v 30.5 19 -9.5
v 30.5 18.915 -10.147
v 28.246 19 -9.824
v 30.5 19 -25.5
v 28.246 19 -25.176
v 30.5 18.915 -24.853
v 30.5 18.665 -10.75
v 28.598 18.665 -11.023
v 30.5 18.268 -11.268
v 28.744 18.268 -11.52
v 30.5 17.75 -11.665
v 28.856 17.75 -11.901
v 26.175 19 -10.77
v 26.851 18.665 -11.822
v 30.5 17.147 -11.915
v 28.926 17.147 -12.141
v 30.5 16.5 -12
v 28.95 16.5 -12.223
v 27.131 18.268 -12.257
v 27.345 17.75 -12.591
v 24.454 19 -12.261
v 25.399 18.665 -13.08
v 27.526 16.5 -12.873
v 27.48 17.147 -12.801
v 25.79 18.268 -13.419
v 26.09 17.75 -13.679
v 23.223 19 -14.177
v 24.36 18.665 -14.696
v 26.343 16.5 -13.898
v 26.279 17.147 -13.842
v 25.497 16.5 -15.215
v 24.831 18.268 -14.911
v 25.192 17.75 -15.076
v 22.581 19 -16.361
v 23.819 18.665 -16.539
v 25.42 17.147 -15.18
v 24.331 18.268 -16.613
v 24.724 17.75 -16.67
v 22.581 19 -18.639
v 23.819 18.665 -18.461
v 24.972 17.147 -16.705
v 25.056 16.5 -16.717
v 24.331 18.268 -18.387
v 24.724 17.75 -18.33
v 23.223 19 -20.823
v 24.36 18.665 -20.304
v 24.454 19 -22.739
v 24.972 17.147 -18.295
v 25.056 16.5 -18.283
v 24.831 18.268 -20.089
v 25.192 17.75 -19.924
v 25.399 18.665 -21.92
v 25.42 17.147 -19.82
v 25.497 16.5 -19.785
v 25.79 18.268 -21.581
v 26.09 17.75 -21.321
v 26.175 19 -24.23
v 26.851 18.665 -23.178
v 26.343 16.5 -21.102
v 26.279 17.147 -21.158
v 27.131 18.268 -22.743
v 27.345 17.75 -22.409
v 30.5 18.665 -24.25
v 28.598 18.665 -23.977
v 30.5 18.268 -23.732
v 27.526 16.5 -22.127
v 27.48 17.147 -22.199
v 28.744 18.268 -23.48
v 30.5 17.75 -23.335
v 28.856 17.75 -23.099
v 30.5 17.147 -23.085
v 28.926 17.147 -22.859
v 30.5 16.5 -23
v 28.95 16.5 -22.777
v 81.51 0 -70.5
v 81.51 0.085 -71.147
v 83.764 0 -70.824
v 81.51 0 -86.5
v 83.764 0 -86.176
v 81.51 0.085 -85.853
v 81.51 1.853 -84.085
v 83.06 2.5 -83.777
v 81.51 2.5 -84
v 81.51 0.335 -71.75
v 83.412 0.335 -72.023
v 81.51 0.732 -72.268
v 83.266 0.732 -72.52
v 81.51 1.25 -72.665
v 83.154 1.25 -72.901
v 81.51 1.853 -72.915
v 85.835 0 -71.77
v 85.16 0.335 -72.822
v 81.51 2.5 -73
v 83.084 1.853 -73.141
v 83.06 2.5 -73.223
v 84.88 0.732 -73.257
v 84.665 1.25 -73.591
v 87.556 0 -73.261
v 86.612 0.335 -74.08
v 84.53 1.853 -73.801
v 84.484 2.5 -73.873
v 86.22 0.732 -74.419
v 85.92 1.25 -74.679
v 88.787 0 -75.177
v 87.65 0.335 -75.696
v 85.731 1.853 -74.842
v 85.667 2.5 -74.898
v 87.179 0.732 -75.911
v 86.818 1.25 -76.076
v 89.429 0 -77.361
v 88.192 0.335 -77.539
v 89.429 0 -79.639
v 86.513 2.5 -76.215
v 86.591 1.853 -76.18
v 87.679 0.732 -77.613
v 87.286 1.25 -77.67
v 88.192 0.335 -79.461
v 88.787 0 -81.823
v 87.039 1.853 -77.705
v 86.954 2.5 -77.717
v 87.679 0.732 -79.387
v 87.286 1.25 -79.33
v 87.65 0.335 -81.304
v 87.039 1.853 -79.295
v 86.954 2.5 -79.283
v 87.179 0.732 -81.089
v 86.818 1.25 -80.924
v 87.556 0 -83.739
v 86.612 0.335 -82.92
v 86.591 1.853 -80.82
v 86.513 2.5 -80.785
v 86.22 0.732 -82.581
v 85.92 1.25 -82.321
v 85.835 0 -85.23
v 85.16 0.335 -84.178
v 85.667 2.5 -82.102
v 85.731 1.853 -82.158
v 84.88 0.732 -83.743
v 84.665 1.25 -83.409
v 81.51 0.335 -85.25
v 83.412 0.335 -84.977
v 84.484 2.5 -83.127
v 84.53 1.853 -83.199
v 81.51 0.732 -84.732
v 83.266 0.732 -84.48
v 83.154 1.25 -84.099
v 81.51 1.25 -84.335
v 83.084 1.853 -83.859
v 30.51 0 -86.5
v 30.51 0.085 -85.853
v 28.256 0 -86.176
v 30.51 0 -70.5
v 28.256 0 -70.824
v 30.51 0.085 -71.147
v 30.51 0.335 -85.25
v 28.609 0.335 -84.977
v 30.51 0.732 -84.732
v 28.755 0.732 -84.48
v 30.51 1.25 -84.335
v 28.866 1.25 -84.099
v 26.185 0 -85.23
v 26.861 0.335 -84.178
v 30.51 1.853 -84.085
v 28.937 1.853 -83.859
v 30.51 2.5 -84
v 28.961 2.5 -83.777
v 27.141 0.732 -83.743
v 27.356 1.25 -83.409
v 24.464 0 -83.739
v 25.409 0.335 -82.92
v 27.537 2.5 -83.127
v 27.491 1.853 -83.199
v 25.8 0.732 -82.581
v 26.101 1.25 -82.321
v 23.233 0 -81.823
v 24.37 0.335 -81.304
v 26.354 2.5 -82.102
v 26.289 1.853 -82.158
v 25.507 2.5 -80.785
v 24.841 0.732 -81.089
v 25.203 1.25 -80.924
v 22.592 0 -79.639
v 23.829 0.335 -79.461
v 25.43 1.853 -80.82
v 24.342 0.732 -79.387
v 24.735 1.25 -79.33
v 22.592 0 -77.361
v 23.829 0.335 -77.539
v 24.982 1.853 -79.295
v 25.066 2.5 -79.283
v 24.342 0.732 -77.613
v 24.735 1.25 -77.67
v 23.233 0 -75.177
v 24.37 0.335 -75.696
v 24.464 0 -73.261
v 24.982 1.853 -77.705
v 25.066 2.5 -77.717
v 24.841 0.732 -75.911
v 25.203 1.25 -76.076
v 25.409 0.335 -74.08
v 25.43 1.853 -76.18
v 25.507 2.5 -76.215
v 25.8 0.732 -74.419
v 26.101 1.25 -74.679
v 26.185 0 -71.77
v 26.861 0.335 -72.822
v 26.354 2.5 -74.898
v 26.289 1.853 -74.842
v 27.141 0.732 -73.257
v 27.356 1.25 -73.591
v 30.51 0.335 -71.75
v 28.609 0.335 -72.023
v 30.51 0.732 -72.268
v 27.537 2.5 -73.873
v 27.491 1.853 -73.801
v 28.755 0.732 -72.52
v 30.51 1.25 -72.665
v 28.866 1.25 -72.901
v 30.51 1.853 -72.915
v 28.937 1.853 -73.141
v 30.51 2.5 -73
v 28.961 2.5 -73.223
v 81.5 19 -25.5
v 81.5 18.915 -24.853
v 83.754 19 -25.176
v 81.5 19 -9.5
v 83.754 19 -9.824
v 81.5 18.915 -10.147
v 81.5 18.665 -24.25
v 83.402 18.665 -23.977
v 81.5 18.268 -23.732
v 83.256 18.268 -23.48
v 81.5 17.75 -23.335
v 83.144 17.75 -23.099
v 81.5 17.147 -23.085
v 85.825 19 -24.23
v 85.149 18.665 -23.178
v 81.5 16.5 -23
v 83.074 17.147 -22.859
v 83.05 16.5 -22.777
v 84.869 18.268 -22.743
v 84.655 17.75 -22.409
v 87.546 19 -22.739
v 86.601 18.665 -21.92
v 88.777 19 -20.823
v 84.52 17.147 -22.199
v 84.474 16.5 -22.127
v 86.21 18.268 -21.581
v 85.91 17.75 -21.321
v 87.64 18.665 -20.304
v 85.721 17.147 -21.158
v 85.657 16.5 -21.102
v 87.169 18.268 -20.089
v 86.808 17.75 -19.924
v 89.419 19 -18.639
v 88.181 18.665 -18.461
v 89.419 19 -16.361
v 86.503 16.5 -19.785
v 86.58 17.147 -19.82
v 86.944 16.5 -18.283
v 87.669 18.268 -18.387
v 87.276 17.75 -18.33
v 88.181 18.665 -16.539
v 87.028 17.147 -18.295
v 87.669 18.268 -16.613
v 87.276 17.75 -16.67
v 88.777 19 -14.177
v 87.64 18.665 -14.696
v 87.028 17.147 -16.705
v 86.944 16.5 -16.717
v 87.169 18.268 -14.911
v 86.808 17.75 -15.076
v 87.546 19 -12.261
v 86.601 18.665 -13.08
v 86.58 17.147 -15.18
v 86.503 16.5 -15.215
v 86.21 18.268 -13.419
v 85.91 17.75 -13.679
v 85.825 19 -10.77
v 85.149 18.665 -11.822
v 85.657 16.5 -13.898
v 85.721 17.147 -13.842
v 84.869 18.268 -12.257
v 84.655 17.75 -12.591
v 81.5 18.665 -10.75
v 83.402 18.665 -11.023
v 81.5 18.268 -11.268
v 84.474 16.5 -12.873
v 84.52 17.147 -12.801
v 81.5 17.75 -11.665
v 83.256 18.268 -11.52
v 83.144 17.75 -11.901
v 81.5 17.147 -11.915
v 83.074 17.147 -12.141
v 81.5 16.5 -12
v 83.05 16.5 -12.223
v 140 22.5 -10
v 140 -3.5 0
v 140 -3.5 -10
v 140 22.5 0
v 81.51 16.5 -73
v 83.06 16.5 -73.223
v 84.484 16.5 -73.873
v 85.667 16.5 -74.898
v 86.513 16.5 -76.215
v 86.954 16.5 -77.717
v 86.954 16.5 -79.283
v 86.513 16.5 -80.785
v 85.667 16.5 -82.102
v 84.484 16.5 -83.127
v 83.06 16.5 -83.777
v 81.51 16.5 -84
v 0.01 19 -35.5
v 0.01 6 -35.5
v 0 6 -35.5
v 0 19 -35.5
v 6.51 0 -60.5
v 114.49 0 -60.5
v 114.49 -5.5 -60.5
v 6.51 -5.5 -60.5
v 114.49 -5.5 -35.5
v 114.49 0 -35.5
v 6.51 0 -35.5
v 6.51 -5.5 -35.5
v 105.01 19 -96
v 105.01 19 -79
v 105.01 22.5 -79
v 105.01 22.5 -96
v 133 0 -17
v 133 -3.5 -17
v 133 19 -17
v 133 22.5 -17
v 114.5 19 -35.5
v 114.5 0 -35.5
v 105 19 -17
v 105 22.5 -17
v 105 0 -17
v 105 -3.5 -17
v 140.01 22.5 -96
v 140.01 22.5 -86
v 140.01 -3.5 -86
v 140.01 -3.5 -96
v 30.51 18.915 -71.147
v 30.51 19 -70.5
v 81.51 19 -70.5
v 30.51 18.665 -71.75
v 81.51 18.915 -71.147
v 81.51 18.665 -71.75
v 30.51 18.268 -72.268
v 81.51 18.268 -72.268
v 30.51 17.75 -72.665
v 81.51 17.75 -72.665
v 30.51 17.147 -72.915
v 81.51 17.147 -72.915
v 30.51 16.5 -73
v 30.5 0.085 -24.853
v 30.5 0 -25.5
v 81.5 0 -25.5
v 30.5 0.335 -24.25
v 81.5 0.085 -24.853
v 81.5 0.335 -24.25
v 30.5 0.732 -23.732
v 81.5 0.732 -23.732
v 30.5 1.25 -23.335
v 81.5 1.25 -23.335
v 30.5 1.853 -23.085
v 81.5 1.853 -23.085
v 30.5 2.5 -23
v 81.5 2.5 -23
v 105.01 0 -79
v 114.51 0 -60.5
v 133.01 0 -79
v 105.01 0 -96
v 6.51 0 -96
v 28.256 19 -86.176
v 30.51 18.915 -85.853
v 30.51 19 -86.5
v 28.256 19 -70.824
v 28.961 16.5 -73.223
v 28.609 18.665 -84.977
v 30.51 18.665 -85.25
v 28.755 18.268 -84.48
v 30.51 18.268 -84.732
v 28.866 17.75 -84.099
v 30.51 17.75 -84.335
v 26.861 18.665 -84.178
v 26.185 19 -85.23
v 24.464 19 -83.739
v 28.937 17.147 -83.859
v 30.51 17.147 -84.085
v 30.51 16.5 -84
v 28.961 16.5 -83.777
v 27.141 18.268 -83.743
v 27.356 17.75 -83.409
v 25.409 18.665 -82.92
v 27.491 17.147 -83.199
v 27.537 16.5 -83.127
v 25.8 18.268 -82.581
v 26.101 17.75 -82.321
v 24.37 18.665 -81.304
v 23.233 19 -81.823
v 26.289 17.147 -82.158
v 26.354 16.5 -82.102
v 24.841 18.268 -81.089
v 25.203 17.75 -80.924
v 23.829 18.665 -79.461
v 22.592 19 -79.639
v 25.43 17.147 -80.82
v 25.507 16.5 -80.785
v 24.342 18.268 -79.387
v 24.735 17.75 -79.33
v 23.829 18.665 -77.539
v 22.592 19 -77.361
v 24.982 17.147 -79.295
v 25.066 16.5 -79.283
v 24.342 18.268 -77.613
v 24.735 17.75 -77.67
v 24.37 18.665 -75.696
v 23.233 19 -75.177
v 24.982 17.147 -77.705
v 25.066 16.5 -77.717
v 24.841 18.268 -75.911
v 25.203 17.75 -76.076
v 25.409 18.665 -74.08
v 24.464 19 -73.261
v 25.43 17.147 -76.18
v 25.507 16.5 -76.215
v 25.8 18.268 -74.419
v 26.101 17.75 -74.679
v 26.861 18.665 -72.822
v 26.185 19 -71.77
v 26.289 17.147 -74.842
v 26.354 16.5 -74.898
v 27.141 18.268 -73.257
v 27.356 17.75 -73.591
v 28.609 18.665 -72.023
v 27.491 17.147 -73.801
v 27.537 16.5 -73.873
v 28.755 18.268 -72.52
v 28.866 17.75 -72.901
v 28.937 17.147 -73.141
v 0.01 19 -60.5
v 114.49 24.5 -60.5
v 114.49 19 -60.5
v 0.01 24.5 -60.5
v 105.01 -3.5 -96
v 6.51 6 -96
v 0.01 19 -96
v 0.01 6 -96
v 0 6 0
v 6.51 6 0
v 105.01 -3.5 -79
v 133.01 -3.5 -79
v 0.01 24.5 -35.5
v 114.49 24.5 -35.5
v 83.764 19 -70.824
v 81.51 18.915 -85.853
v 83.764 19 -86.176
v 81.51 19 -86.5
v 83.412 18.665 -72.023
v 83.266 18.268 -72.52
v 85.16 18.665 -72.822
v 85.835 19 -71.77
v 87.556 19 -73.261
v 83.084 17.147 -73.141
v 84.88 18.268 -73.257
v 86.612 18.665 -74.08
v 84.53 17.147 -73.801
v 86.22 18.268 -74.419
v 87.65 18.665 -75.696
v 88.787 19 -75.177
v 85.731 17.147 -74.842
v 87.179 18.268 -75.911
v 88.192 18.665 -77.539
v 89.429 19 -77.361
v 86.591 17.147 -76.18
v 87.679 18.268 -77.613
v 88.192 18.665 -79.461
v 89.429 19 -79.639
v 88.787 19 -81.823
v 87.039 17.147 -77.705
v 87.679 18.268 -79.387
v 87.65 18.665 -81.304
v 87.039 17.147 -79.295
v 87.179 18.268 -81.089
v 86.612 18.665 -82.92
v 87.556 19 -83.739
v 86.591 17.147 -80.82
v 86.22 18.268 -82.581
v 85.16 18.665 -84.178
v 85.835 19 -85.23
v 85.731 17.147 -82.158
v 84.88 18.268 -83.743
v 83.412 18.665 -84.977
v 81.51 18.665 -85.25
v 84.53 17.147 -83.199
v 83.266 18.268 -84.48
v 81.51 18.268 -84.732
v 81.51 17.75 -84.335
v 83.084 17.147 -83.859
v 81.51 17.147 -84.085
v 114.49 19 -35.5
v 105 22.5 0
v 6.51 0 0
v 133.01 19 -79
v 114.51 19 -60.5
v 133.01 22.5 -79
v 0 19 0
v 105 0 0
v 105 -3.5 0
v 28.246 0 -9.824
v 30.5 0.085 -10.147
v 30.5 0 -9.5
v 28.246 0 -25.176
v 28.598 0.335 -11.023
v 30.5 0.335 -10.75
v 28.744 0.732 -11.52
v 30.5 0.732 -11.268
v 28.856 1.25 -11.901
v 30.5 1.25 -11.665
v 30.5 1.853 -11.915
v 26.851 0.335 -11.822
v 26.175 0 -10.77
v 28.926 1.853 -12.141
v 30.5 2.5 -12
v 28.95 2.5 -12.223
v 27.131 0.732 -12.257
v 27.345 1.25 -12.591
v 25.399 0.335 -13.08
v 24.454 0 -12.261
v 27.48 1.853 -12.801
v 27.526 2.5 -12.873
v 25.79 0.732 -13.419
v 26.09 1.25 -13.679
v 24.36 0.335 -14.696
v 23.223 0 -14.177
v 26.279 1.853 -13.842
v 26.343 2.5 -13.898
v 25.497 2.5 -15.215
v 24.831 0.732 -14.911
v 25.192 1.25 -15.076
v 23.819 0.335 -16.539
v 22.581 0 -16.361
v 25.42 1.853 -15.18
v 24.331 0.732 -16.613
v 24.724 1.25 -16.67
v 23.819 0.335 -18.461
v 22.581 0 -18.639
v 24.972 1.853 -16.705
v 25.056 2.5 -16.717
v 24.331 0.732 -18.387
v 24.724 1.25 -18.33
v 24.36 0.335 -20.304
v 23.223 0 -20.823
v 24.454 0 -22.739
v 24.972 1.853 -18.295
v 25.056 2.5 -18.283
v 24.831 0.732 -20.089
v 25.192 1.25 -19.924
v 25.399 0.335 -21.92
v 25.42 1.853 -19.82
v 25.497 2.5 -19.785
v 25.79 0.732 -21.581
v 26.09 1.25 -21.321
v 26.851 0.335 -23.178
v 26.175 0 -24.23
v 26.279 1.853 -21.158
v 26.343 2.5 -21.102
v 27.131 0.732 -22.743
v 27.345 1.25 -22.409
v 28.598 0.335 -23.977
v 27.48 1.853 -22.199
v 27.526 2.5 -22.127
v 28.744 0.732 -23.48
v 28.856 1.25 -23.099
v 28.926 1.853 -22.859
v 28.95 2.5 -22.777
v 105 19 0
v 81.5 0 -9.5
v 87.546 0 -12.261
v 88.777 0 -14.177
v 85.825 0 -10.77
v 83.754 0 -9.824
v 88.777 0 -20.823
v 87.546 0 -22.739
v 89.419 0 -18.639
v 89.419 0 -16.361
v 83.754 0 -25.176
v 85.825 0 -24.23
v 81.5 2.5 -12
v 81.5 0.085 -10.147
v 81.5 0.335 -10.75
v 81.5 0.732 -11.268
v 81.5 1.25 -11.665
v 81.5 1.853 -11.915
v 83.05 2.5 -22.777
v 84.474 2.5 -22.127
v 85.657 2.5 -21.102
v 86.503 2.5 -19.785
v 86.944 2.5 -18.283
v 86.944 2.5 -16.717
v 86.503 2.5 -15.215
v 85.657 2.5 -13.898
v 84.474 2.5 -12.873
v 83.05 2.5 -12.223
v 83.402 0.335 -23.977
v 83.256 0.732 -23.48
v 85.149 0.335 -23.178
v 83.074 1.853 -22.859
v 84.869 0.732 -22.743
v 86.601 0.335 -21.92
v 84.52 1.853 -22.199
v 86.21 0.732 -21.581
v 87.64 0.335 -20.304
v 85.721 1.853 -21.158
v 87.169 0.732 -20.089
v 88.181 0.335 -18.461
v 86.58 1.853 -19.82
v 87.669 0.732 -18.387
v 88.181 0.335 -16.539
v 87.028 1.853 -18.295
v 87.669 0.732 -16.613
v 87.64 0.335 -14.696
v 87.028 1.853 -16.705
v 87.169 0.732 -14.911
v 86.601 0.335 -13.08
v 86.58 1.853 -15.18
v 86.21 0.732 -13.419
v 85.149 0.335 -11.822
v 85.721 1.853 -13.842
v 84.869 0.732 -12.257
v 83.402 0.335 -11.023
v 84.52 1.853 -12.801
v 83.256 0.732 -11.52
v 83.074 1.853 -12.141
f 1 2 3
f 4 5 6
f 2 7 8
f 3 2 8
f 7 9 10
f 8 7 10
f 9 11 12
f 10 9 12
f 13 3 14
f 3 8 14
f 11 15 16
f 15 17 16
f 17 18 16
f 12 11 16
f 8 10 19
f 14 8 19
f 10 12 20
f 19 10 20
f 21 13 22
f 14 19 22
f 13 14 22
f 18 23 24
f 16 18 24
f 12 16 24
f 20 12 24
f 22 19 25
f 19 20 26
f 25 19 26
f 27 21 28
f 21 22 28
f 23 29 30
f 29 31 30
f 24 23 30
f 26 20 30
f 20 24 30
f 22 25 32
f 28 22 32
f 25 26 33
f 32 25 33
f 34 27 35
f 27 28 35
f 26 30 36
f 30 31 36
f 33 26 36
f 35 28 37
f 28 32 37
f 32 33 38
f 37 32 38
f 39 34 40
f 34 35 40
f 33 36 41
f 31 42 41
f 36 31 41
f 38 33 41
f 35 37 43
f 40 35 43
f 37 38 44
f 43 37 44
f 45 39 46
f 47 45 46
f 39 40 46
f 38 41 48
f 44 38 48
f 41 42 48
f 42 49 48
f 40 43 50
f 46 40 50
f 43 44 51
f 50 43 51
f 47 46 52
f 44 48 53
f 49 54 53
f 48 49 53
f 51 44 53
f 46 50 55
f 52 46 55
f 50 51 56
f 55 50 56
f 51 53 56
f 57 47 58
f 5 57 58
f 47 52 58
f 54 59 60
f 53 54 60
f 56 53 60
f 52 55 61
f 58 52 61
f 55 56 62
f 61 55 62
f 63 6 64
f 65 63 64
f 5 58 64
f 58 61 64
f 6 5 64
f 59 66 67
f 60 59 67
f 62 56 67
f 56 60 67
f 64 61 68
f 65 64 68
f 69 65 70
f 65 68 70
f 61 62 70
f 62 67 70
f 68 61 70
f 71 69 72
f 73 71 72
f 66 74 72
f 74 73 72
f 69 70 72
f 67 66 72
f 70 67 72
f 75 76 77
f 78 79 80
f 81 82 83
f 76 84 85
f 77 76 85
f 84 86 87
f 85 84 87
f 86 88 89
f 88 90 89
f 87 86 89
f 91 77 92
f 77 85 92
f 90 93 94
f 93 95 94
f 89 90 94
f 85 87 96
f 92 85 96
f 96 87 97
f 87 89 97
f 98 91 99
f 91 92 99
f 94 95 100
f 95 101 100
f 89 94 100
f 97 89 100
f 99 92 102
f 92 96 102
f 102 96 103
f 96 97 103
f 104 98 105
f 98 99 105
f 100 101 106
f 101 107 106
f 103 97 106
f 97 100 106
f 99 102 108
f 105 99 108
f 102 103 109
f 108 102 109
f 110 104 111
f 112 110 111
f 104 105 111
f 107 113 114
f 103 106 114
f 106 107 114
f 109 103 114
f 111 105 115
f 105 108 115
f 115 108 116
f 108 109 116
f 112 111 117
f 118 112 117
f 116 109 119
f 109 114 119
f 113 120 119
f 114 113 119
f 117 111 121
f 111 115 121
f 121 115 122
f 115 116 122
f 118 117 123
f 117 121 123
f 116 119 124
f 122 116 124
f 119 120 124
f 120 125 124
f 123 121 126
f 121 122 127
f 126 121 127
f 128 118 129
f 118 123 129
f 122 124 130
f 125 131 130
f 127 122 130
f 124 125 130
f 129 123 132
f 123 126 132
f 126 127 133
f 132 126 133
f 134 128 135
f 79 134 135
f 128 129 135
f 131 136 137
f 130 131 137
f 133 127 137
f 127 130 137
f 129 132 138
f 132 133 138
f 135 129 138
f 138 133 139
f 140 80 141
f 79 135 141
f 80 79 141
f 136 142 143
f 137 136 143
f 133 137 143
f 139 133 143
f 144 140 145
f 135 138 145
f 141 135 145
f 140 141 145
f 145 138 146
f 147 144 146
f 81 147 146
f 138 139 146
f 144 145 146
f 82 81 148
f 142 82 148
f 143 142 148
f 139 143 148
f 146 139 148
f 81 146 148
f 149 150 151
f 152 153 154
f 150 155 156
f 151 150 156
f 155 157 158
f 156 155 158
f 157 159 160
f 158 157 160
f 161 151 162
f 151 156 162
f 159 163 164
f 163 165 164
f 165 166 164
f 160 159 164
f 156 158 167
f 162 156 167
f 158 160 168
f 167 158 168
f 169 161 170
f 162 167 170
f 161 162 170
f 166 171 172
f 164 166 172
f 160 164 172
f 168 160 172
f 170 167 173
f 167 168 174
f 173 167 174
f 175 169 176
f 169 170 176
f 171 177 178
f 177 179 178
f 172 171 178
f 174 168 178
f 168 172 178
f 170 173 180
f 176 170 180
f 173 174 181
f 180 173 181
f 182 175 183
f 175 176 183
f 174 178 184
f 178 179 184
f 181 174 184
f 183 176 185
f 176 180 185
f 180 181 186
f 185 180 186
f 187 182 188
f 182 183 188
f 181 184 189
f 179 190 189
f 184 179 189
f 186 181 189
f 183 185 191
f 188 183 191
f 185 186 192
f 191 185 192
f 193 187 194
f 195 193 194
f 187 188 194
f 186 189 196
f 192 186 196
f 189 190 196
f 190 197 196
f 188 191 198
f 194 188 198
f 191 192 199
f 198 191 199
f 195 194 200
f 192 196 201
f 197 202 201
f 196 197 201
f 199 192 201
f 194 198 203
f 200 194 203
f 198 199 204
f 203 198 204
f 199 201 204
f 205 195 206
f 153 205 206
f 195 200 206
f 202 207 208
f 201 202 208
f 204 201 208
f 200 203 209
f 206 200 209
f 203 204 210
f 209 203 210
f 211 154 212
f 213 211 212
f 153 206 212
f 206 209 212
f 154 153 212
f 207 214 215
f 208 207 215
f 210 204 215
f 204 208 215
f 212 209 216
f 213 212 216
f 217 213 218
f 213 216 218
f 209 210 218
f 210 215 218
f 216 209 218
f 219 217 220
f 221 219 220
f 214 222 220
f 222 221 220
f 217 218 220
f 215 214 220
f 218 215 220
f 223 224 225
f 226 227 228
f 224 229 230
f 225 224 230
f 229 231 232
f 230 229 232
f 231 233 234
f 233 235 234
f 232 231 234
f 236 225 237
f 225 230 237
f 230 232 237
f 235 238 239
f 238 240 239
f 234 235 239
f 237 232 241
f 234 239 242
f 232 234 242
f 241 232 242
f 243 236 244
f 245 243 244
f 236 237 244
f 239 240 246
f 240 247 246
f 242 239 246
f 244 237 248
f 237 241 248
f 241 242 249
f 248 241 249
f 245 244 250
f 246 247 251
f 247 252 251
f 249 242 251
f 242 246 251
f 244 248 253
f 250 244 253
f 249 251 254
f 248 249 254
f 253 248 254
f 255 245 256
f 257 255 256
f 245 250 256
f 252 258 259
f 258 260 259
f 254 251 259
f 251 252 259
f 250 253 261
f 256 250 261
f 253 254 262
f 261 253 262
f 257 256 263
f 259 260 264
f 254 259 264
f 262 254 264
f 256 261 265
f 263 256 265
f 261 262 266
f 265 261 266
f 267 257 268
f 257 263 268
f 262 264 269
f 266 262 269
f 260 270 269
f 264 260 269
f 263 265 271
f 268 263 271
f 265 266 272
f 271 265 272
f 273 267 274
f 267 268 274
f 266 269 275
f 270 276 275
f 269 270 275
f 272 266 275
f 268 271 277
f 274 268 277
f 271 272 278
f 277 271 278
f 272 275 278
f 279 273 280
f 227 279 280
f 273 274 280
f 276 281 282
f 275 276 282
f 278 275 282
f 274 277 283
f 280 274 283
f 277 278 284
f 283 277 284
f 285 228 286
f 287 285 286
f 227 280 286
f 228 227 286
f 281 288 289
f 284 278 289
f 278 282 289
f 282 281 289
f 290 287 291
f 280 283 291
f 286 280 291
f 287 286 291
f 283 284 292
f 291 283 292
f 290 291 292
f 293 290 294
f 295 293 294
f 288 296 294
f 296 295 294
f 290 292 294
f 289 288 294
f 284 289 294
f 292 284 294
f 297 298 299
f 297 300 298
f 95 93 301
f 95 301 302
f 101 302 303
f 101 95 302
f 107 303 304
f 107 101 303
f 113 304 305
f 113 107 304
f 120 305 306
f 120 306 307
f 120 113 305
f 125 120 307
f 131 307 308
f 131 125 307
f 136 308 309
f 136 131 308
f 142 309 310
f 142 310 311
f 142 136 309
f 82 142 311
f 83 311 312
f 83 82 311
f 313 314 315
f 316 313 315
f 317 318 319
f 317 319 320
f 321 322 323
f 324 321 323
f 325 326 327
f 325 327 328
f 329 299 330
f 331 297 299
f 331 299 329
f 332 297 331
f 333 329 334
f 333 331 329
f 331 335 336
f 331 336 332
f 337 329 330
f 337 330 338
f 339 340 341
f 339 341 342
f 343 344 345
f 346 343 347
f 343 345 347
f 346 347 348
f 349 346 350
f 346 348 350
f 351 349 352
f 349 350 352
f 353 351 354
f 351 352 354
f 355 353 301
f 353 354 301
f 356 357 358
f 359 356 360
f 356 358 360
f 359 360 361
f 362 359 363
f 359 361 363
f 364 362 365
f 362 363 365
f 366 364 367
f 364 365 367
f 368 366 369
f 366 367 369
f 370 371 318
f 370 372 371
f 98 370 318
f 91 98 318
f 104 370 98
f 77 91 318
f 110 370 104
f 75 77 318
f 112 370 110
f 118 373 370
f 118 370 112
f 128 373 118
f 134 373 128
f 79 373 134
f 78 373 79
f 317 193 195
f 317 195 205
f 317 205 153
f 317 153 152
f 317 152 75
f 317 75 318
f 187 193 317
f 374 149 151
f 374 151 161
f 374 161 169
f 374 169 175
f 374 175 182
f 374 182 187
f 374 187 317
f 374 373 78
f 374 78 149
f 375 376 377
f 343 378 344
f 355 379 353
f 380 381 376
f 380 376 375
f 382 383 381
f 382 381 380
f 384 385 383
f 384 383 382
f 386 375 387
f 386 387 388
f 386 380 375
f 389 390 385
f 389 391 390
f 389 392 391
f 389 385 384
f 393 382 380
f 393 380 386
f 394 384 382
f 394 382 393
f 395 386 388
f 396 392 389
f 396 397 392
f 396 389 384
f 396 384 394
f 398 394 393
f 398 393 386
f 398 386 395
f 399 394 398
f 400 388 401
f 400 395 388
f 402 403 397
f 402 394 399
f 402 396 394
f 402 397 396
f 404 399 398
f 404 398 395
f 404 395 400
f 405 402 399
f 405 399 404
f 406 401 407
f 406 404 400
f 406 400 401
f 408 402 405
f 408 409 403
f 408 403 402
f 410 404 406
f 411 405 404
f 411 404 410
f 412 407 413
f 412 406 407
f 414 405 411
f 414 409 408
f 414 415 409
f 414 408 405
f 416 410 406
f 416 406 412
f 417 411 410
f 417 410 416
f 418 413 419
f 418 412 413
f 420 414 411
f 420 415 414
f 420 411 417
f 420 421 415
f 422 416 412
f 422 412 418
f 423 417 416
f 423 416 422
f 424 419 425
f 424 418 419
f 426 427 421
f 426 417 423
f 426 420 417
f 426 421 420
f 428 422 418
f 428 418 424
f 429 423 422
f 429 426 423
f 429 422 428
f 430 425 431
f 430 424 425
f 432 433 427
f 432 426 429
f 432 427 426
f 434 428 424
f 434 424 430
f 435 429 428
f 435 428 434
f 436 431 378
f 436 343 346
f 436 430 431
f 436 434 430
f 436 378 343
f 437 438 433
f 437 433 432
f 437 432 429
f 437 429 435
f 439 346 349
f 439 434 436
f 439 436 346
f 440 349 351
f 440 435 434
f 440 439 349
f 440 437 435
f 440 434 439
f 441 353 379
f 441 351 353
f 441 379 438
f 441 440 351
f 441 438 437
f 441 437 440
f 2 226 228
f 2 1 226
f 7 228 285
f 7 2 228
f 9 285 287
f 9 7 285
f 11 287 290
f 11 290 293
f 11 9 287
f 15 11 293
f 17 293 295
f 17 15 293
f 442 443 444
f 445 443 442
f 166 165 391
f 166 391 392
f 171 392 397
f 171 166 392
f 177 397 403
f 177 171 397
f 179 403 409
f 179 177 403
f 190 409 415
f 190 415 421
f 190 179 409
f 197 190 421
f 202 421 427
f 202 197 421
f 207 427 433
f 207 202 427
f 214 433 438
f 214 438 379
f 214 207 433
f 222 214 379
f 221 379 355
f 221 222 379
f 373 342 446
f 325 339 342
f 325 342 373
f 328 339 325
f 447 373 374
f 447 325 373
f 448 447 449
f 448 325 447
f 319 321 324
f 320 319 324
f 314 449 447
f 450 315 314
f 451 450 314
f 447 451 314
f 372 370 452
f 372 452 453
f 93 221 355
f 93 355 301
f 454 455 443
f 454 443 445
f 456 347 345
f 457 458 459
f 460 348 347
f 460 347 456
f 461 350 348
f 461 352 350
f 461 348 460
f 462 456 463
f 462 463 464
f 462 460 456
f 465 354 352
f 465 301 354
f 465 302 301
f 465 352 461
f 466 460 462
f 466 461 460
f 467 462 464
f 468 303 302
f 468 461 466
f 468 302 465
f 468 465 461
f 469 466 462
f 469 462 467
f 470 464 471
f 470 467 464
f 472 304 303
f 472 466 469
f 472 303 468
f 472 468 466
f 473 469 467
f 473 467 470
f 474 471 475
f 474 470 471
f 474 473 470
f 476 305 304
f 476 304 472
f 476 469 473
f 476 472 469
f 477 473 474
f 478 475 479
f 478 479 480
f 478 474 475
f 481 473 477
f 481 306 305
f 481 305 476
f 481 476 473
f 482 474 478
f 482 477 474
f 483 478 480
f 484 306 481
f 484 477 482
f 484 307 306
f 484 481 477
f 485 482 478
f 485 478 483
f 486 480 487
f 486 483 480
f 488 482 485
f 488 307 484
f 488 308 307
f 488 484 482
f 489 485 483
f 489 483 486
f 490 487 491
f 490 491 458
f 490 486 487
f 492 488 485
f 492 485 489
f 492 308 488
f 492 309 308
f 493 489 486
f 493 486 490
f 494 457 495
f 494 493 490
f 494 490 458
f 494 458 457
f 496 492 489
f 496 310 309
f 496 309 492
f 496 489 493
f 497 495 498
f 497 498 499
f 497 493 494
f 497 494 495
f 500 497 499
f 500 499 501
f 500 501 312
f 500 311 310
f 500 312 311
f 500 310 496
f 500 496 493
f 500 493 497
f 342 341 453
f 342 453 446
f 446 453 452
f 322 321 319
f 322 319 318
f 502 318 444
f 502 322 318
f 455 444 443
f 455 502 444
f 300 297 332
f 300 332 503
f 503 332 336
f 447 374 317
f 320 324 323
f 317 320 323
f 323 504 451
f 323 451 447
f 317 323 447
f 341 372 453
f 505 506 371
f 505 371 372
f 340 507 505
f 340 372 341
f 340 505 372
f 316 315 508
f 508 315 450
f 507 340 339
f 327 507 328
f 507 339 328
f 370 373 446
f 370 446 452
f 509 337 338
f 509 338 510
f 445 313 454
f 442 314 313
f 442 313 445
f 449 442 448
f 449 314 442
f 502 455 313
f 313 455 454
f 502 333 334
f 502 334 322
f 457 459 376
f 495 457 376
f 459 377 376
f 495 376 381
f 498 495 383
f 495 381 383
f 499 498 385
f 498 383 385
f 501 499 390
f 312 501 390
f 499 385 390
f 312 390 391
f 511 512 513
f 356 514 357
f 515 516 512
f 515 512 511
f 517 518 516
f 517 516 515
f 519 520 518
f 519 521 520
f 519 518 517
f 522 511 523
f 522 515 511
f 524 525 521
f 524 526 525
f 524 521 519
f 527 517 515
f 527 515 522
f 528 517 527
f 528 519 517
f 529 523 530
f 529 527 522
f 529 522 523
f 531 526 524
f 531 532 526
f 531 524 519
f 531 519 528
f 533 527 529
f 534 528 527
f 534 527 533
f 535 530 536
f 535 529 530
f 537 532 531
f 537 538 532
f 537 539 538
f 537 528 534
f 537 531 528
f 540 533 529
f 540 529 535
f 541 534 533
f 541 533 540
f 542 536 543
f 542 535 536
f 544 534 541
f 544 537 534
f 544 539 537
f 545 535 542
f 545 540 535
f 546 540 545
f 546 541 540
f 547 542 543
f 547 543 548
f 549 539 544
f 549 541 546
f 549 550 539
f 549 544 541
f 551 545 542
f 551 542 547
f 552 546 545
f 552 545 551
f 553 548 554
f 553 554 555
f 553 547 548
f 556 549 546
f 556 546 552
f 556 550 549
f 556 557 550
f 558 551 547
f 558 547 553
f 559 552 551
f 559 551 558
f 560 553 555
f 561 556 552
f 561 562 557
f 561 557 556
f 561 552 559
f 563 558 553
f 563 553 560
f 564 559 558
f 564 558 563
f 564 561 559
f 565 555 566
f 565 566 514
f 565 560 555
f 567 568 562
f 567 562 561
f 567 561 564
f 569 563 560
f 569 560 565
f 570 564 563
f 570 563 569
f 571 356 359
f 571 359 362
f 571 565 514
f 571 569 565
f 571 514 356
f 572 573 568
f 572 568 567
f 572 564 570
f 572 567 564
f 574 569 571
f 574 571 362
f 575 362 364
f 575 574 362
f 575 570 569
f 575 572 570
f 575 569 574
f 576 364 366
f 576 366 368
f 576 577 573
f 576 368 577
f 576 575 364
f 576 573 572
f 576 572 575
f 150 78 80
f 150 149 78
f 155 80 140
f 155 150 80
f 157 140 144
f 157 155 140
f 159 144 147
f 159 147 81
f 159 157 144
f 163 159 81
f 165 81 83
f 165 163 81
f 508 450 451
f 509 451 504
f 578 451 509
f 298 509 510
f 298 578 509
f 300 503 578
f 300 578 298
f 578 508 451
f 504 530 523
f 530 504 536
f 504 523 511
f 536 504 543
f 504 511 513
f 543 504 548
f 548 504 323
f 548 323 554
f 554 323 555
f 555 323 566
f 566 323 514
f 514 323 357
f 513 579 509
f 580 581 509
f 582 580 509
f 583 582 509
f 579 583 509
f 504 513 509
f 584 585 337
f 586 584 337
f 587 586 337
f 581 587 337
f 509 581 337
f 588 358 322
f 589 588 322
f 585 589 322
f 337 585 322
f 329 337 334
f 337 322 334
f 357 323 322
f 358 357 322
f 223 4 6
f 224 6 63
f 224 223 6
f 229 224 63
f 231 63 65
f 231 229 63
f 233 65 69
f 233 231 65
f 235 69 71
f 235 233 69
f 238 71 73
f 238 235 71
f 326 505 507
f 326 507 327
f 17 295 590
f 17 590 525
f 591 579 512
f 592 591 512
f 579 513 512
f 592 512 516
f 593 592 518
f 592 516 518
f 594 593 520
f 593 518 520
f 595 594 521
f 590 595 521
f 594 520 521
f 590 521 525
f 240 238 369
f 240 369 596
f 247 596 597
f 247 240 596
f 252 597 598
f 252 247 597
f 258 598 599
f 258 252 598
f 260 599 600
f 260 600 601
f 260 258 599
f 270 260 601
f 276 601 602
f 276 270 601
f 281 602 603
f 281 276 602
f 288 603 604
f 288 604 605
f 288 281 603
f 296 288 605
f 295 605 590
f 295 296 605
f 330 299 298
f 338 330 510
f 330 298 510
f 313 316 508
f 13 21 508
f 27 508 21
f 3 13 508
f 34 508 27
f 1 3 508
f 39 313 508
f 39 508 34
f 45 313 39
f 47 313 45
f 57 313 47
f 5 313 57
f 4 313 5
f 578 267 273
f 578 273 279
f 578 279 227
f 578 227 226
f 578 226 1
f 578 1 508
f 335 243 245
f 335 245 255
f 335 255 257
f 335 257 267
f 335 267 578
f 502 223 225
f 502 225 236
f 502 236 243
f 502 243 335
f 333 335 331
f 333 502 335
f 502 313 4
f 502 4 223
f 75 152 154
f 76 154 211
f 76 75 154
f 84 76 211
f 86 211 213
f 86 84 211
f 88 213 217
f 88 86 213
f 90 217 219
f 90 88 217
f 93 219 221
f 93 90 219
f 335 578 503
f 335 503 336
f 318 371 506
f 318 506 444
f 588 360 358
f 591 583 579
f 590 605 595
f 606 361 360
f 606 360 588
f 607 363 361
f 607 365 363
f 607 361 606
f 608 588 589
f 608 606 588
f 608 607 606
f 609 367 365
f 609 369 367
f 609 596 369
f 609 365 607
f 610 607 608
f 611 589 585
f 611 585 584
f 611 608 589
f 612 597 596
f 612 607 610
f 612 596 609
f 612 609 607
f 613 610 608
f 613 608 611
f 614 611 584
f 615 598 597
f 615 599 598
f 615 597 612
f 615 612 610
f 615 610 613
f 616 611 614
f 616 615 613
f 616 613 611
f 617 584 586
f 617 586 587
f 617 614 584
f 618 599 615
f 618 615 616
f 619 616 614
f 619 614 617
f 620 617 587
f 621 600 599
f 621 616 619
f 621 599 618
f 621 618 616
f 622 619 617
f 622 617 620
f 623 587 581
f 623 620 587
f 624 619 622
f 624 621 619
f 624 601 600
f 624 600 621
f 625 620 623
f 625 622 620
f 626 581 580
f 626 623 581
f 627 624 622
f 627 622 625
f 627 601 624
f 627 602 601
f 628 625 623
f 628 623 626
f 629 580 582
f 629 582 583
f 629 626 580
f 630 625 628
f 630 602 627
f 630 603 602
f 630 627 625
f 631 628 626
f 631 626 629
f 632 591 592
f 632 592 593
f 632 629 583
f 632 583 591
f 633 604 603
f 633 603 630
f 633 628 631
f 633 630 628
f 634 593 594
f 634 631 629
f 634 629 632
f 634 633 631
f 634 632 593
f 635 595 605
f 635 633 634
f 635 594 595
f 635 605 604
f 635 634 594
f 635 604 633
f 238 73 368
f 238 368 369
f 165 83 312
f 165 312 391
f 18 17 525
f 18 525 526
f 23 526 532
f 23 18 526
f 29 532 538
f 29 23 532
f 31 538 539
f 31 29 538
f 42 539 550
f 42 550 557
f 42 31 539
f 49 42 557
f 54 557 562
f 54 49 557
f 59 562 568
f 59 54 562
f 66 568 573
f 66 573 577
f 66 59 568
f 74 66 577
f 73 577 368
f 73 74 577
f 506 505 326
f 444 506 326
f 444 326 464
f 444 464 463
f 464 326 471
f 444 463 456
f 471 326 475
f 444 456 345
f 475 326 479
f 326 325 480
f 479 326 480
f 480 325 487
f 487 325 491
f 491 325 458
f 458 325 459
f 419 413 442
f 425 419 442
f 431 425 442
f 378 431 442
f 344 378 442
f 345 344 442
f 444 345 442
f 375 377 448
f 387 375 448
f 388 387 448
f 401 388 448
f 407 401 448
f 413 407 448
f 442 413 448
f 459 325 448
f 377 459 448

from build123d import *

# Parameters (mm, degrees)
BOSS_EXTRUDE1_DEPTH  = 19
BOSS_EXTRUDE2_DEPTH  = 3.5
BOSS_EXTRUDE3_DEPTH  = 3.5
SKETCH4_W            = 114.479344172
SKETCH4_H            = 30
BOSS_EXTRUDE4_DEPTH  = 25
CUT_EXTRUDE1_DEPTH   = 25
FILLET1_R            = 2.5
BOSS_EXTRUDE8_DEPTH  = 19
BOSS_EXTRUDE9_DEPTH  = 3.5
BOSS_EXTRUDE10_DEPTH = 3.5
CUT_EXTRUDE2_DEPTH   = 43.5
FILLET2_R            = 2.5
SKETCH13_W           = 6.5
SKETCH13_H           = 11.5
CUT_EXTRUDE4_DEPTH   = 172.520091892
SKETCH14_W           = 35.5
SKETCH14_H           = 6
CUT_EXTRUDE5_DEPTH   = 1.5


with BuildPart() as part:
    # Sketch1 → Boss-Extrude1 (new body)
    with BuildSketch(Plane(origin=(0, 0, 0), x_dir=(1, 0, 0), z_dir=(0, 1, 0))):
        Polygon((0, 0), (140, 0), (140, 10), (114.5, 35.5), (0, 35.5), align=None)
    extrude(amount=BOSS_EXTRUDE1_DEPTH)

    # Sketch2 → Boss-Extrude2 (add)
    with BuildSketch(Plane(origin=(0, 19, 0), x_dir=(1, 0, 0), z_dir=(0, 1, 0))):
        Polygon((140, 0), (105, 0), (105, 17), (133, 17), (140, 10), align=None)
    extrude(amount=BOSS_EXTRUDE2_DEPTH)

    # Sketch3 → Boss-Extrude3 (add)
    with BuildSketch(Plane.XZ):
        Polygon((140, -10), (133, -17), (105, -17), (105, 0), (140, 0), align=None)
    extrude(amount=BOSS_EXTRUDE3_DEPTH)

    # Sketch4 → Boss-Extrude4 (add)
    with BuildSketch(Plane(origin=(0, 0, -35.5), x_dir=(-1, 0, 0), z_dir=(0, 0, -1))):
        with Locations((-57.25, 9.5)):
            Rectangle(SKETCH4_W, SKETCH4_H)
    extrude(amount=BOSS_EXTRUDE4_DEPTH)

    # Sketch5 → Cut-Extrude1 (cut)
    with BuildSketch(Plane(origin=(0, 19, 0), x_dir=(1, 0, 0), z_dir=(0, 1, 0))):
        with BuildLine():
            Line((30.5, 23), (81.5, 23))
            ThreePointArc((81.5, 23), (87, 17.5), (81.5, 12))
            Line((81.5, 12), (30.5, 12))
            ThreePointArc((30.5, 12), (25, 17.5), (30.5, 23))
        make_face()
    extrude(amount=-CUT_EXTRUDE1_DEPTH, mode=Mode.SUBTRACT)

    # Fillet1
    fillet1_edges = [part.edges().sort_by_distance(p)[0] for p in [
        (56, 0, -12),
        (87, 0, -17.5),
        (56, 0, -23),
        (25, 0, -17.5),
        (25, 19, -17.5),
        (56, 19, -12),
        (87, 19, -17.5),
        (56, 19, -23),
    ]]
    fillet(fillet1_edges, radius=FILLET1_R)

    # Sketch7 → Boss-Extrude8 (add)
    with BuildSketch(Plane(origin=(0, 0, 0), x_dir=(1, 0, 0), z_dir=(0, 1, 0))):
        Polygon((0.010327914, 60.5), (0.010327914, 96), (140.010327914, 96), (140.010327914, 86), (114.510327914, 60.5), align=None)
    extrude(amount=BOSS_EXTRUDE8_DEPTH)

    # Sketch10 → Boss-Extrude9 (add)
    with BuildSketch(Plane(origin=(0, 19, 0), x_dir=(1, 0, 0), z_dir=(0, 1, 0))):
        Polygon((140.010327914, 86), (133.010327914, 79), (105.010327914, 79), (105.010327914, 96), (140.010327914, 96), align=None)
    extrude(amount=BOSS_EXTRUDE9_DEPTH)

    # Sketch11 → Boss-Extrude10 (add)
    with BuildSketch(Plane.XZ):
        Polygon((133.010327914, -79), (140.010327914, -86), (140.010327914, -96), (105.010327914, -96), (105.010327914, -79), align=None)
    extrude(amount=BOSS_EXTRUDE10_DEPTH)

    # Sketch12 → Cut-Extrude2 (cut)
    with BuildSketch(Plane.XZ):
        with BuildLine():
            Line((30.510327914, -73), (81.510327914, -73))
            ThreePointArc((81.510327914, -73), (87.010327914, -78.5), (81.510327914, -84))
            Line((81.510327914, -84), (30.510327914, -84))
            ThreePointArc((30.510327914, -84), (25.010327914, -78.5), (30.510327914, -73))
        make_face()
    extrude(amount=-CUT_EXTRUDE2_DEPTH, mode=Mode.SUBTRACT)

    # Fillet2
    fillet2_edges = [part.edges().sort_by_distance(p)[0] for p in [
        (56.010327914, 19, -84),
        (87.010327914, 19, -78.5),
        (56.010327914, 19, -73),
        (25.010327914, 19, -78.5),
        (25.010327914, 0, -78.5),
        (56.010327914, 0, -84),
        (87.010327914, 0, -78.5),
        (56.010327914, 0, -73),
    ]]
    fillet(fillet2_edges, radius=FILLET2_R)

    # Sketch13 → Cut-Extrude4 (cut, through all)
    with BuildSketch(Plane.XY):
        with Locations((3.260327914, 0.25)):
            Rectangle(SKETCH13_W, SKETCH13_H)
    extrude(amount=-CUT_EXTRUDE4_DEPTH, mode=Mode.SUBTRACT)

    # Sketch14 → Cut-Extrude5 (cut)
    with BuildSketch(Plane.ZY):
        with Locations((-17.75, 3)):
            Rectangle(SKETCH14_W, SKETCH14_H)
    extrude(amount=-CUT_EXTRUDE5_DEPTH, mode=Mode.SUBTRACT)


solid = part.part
